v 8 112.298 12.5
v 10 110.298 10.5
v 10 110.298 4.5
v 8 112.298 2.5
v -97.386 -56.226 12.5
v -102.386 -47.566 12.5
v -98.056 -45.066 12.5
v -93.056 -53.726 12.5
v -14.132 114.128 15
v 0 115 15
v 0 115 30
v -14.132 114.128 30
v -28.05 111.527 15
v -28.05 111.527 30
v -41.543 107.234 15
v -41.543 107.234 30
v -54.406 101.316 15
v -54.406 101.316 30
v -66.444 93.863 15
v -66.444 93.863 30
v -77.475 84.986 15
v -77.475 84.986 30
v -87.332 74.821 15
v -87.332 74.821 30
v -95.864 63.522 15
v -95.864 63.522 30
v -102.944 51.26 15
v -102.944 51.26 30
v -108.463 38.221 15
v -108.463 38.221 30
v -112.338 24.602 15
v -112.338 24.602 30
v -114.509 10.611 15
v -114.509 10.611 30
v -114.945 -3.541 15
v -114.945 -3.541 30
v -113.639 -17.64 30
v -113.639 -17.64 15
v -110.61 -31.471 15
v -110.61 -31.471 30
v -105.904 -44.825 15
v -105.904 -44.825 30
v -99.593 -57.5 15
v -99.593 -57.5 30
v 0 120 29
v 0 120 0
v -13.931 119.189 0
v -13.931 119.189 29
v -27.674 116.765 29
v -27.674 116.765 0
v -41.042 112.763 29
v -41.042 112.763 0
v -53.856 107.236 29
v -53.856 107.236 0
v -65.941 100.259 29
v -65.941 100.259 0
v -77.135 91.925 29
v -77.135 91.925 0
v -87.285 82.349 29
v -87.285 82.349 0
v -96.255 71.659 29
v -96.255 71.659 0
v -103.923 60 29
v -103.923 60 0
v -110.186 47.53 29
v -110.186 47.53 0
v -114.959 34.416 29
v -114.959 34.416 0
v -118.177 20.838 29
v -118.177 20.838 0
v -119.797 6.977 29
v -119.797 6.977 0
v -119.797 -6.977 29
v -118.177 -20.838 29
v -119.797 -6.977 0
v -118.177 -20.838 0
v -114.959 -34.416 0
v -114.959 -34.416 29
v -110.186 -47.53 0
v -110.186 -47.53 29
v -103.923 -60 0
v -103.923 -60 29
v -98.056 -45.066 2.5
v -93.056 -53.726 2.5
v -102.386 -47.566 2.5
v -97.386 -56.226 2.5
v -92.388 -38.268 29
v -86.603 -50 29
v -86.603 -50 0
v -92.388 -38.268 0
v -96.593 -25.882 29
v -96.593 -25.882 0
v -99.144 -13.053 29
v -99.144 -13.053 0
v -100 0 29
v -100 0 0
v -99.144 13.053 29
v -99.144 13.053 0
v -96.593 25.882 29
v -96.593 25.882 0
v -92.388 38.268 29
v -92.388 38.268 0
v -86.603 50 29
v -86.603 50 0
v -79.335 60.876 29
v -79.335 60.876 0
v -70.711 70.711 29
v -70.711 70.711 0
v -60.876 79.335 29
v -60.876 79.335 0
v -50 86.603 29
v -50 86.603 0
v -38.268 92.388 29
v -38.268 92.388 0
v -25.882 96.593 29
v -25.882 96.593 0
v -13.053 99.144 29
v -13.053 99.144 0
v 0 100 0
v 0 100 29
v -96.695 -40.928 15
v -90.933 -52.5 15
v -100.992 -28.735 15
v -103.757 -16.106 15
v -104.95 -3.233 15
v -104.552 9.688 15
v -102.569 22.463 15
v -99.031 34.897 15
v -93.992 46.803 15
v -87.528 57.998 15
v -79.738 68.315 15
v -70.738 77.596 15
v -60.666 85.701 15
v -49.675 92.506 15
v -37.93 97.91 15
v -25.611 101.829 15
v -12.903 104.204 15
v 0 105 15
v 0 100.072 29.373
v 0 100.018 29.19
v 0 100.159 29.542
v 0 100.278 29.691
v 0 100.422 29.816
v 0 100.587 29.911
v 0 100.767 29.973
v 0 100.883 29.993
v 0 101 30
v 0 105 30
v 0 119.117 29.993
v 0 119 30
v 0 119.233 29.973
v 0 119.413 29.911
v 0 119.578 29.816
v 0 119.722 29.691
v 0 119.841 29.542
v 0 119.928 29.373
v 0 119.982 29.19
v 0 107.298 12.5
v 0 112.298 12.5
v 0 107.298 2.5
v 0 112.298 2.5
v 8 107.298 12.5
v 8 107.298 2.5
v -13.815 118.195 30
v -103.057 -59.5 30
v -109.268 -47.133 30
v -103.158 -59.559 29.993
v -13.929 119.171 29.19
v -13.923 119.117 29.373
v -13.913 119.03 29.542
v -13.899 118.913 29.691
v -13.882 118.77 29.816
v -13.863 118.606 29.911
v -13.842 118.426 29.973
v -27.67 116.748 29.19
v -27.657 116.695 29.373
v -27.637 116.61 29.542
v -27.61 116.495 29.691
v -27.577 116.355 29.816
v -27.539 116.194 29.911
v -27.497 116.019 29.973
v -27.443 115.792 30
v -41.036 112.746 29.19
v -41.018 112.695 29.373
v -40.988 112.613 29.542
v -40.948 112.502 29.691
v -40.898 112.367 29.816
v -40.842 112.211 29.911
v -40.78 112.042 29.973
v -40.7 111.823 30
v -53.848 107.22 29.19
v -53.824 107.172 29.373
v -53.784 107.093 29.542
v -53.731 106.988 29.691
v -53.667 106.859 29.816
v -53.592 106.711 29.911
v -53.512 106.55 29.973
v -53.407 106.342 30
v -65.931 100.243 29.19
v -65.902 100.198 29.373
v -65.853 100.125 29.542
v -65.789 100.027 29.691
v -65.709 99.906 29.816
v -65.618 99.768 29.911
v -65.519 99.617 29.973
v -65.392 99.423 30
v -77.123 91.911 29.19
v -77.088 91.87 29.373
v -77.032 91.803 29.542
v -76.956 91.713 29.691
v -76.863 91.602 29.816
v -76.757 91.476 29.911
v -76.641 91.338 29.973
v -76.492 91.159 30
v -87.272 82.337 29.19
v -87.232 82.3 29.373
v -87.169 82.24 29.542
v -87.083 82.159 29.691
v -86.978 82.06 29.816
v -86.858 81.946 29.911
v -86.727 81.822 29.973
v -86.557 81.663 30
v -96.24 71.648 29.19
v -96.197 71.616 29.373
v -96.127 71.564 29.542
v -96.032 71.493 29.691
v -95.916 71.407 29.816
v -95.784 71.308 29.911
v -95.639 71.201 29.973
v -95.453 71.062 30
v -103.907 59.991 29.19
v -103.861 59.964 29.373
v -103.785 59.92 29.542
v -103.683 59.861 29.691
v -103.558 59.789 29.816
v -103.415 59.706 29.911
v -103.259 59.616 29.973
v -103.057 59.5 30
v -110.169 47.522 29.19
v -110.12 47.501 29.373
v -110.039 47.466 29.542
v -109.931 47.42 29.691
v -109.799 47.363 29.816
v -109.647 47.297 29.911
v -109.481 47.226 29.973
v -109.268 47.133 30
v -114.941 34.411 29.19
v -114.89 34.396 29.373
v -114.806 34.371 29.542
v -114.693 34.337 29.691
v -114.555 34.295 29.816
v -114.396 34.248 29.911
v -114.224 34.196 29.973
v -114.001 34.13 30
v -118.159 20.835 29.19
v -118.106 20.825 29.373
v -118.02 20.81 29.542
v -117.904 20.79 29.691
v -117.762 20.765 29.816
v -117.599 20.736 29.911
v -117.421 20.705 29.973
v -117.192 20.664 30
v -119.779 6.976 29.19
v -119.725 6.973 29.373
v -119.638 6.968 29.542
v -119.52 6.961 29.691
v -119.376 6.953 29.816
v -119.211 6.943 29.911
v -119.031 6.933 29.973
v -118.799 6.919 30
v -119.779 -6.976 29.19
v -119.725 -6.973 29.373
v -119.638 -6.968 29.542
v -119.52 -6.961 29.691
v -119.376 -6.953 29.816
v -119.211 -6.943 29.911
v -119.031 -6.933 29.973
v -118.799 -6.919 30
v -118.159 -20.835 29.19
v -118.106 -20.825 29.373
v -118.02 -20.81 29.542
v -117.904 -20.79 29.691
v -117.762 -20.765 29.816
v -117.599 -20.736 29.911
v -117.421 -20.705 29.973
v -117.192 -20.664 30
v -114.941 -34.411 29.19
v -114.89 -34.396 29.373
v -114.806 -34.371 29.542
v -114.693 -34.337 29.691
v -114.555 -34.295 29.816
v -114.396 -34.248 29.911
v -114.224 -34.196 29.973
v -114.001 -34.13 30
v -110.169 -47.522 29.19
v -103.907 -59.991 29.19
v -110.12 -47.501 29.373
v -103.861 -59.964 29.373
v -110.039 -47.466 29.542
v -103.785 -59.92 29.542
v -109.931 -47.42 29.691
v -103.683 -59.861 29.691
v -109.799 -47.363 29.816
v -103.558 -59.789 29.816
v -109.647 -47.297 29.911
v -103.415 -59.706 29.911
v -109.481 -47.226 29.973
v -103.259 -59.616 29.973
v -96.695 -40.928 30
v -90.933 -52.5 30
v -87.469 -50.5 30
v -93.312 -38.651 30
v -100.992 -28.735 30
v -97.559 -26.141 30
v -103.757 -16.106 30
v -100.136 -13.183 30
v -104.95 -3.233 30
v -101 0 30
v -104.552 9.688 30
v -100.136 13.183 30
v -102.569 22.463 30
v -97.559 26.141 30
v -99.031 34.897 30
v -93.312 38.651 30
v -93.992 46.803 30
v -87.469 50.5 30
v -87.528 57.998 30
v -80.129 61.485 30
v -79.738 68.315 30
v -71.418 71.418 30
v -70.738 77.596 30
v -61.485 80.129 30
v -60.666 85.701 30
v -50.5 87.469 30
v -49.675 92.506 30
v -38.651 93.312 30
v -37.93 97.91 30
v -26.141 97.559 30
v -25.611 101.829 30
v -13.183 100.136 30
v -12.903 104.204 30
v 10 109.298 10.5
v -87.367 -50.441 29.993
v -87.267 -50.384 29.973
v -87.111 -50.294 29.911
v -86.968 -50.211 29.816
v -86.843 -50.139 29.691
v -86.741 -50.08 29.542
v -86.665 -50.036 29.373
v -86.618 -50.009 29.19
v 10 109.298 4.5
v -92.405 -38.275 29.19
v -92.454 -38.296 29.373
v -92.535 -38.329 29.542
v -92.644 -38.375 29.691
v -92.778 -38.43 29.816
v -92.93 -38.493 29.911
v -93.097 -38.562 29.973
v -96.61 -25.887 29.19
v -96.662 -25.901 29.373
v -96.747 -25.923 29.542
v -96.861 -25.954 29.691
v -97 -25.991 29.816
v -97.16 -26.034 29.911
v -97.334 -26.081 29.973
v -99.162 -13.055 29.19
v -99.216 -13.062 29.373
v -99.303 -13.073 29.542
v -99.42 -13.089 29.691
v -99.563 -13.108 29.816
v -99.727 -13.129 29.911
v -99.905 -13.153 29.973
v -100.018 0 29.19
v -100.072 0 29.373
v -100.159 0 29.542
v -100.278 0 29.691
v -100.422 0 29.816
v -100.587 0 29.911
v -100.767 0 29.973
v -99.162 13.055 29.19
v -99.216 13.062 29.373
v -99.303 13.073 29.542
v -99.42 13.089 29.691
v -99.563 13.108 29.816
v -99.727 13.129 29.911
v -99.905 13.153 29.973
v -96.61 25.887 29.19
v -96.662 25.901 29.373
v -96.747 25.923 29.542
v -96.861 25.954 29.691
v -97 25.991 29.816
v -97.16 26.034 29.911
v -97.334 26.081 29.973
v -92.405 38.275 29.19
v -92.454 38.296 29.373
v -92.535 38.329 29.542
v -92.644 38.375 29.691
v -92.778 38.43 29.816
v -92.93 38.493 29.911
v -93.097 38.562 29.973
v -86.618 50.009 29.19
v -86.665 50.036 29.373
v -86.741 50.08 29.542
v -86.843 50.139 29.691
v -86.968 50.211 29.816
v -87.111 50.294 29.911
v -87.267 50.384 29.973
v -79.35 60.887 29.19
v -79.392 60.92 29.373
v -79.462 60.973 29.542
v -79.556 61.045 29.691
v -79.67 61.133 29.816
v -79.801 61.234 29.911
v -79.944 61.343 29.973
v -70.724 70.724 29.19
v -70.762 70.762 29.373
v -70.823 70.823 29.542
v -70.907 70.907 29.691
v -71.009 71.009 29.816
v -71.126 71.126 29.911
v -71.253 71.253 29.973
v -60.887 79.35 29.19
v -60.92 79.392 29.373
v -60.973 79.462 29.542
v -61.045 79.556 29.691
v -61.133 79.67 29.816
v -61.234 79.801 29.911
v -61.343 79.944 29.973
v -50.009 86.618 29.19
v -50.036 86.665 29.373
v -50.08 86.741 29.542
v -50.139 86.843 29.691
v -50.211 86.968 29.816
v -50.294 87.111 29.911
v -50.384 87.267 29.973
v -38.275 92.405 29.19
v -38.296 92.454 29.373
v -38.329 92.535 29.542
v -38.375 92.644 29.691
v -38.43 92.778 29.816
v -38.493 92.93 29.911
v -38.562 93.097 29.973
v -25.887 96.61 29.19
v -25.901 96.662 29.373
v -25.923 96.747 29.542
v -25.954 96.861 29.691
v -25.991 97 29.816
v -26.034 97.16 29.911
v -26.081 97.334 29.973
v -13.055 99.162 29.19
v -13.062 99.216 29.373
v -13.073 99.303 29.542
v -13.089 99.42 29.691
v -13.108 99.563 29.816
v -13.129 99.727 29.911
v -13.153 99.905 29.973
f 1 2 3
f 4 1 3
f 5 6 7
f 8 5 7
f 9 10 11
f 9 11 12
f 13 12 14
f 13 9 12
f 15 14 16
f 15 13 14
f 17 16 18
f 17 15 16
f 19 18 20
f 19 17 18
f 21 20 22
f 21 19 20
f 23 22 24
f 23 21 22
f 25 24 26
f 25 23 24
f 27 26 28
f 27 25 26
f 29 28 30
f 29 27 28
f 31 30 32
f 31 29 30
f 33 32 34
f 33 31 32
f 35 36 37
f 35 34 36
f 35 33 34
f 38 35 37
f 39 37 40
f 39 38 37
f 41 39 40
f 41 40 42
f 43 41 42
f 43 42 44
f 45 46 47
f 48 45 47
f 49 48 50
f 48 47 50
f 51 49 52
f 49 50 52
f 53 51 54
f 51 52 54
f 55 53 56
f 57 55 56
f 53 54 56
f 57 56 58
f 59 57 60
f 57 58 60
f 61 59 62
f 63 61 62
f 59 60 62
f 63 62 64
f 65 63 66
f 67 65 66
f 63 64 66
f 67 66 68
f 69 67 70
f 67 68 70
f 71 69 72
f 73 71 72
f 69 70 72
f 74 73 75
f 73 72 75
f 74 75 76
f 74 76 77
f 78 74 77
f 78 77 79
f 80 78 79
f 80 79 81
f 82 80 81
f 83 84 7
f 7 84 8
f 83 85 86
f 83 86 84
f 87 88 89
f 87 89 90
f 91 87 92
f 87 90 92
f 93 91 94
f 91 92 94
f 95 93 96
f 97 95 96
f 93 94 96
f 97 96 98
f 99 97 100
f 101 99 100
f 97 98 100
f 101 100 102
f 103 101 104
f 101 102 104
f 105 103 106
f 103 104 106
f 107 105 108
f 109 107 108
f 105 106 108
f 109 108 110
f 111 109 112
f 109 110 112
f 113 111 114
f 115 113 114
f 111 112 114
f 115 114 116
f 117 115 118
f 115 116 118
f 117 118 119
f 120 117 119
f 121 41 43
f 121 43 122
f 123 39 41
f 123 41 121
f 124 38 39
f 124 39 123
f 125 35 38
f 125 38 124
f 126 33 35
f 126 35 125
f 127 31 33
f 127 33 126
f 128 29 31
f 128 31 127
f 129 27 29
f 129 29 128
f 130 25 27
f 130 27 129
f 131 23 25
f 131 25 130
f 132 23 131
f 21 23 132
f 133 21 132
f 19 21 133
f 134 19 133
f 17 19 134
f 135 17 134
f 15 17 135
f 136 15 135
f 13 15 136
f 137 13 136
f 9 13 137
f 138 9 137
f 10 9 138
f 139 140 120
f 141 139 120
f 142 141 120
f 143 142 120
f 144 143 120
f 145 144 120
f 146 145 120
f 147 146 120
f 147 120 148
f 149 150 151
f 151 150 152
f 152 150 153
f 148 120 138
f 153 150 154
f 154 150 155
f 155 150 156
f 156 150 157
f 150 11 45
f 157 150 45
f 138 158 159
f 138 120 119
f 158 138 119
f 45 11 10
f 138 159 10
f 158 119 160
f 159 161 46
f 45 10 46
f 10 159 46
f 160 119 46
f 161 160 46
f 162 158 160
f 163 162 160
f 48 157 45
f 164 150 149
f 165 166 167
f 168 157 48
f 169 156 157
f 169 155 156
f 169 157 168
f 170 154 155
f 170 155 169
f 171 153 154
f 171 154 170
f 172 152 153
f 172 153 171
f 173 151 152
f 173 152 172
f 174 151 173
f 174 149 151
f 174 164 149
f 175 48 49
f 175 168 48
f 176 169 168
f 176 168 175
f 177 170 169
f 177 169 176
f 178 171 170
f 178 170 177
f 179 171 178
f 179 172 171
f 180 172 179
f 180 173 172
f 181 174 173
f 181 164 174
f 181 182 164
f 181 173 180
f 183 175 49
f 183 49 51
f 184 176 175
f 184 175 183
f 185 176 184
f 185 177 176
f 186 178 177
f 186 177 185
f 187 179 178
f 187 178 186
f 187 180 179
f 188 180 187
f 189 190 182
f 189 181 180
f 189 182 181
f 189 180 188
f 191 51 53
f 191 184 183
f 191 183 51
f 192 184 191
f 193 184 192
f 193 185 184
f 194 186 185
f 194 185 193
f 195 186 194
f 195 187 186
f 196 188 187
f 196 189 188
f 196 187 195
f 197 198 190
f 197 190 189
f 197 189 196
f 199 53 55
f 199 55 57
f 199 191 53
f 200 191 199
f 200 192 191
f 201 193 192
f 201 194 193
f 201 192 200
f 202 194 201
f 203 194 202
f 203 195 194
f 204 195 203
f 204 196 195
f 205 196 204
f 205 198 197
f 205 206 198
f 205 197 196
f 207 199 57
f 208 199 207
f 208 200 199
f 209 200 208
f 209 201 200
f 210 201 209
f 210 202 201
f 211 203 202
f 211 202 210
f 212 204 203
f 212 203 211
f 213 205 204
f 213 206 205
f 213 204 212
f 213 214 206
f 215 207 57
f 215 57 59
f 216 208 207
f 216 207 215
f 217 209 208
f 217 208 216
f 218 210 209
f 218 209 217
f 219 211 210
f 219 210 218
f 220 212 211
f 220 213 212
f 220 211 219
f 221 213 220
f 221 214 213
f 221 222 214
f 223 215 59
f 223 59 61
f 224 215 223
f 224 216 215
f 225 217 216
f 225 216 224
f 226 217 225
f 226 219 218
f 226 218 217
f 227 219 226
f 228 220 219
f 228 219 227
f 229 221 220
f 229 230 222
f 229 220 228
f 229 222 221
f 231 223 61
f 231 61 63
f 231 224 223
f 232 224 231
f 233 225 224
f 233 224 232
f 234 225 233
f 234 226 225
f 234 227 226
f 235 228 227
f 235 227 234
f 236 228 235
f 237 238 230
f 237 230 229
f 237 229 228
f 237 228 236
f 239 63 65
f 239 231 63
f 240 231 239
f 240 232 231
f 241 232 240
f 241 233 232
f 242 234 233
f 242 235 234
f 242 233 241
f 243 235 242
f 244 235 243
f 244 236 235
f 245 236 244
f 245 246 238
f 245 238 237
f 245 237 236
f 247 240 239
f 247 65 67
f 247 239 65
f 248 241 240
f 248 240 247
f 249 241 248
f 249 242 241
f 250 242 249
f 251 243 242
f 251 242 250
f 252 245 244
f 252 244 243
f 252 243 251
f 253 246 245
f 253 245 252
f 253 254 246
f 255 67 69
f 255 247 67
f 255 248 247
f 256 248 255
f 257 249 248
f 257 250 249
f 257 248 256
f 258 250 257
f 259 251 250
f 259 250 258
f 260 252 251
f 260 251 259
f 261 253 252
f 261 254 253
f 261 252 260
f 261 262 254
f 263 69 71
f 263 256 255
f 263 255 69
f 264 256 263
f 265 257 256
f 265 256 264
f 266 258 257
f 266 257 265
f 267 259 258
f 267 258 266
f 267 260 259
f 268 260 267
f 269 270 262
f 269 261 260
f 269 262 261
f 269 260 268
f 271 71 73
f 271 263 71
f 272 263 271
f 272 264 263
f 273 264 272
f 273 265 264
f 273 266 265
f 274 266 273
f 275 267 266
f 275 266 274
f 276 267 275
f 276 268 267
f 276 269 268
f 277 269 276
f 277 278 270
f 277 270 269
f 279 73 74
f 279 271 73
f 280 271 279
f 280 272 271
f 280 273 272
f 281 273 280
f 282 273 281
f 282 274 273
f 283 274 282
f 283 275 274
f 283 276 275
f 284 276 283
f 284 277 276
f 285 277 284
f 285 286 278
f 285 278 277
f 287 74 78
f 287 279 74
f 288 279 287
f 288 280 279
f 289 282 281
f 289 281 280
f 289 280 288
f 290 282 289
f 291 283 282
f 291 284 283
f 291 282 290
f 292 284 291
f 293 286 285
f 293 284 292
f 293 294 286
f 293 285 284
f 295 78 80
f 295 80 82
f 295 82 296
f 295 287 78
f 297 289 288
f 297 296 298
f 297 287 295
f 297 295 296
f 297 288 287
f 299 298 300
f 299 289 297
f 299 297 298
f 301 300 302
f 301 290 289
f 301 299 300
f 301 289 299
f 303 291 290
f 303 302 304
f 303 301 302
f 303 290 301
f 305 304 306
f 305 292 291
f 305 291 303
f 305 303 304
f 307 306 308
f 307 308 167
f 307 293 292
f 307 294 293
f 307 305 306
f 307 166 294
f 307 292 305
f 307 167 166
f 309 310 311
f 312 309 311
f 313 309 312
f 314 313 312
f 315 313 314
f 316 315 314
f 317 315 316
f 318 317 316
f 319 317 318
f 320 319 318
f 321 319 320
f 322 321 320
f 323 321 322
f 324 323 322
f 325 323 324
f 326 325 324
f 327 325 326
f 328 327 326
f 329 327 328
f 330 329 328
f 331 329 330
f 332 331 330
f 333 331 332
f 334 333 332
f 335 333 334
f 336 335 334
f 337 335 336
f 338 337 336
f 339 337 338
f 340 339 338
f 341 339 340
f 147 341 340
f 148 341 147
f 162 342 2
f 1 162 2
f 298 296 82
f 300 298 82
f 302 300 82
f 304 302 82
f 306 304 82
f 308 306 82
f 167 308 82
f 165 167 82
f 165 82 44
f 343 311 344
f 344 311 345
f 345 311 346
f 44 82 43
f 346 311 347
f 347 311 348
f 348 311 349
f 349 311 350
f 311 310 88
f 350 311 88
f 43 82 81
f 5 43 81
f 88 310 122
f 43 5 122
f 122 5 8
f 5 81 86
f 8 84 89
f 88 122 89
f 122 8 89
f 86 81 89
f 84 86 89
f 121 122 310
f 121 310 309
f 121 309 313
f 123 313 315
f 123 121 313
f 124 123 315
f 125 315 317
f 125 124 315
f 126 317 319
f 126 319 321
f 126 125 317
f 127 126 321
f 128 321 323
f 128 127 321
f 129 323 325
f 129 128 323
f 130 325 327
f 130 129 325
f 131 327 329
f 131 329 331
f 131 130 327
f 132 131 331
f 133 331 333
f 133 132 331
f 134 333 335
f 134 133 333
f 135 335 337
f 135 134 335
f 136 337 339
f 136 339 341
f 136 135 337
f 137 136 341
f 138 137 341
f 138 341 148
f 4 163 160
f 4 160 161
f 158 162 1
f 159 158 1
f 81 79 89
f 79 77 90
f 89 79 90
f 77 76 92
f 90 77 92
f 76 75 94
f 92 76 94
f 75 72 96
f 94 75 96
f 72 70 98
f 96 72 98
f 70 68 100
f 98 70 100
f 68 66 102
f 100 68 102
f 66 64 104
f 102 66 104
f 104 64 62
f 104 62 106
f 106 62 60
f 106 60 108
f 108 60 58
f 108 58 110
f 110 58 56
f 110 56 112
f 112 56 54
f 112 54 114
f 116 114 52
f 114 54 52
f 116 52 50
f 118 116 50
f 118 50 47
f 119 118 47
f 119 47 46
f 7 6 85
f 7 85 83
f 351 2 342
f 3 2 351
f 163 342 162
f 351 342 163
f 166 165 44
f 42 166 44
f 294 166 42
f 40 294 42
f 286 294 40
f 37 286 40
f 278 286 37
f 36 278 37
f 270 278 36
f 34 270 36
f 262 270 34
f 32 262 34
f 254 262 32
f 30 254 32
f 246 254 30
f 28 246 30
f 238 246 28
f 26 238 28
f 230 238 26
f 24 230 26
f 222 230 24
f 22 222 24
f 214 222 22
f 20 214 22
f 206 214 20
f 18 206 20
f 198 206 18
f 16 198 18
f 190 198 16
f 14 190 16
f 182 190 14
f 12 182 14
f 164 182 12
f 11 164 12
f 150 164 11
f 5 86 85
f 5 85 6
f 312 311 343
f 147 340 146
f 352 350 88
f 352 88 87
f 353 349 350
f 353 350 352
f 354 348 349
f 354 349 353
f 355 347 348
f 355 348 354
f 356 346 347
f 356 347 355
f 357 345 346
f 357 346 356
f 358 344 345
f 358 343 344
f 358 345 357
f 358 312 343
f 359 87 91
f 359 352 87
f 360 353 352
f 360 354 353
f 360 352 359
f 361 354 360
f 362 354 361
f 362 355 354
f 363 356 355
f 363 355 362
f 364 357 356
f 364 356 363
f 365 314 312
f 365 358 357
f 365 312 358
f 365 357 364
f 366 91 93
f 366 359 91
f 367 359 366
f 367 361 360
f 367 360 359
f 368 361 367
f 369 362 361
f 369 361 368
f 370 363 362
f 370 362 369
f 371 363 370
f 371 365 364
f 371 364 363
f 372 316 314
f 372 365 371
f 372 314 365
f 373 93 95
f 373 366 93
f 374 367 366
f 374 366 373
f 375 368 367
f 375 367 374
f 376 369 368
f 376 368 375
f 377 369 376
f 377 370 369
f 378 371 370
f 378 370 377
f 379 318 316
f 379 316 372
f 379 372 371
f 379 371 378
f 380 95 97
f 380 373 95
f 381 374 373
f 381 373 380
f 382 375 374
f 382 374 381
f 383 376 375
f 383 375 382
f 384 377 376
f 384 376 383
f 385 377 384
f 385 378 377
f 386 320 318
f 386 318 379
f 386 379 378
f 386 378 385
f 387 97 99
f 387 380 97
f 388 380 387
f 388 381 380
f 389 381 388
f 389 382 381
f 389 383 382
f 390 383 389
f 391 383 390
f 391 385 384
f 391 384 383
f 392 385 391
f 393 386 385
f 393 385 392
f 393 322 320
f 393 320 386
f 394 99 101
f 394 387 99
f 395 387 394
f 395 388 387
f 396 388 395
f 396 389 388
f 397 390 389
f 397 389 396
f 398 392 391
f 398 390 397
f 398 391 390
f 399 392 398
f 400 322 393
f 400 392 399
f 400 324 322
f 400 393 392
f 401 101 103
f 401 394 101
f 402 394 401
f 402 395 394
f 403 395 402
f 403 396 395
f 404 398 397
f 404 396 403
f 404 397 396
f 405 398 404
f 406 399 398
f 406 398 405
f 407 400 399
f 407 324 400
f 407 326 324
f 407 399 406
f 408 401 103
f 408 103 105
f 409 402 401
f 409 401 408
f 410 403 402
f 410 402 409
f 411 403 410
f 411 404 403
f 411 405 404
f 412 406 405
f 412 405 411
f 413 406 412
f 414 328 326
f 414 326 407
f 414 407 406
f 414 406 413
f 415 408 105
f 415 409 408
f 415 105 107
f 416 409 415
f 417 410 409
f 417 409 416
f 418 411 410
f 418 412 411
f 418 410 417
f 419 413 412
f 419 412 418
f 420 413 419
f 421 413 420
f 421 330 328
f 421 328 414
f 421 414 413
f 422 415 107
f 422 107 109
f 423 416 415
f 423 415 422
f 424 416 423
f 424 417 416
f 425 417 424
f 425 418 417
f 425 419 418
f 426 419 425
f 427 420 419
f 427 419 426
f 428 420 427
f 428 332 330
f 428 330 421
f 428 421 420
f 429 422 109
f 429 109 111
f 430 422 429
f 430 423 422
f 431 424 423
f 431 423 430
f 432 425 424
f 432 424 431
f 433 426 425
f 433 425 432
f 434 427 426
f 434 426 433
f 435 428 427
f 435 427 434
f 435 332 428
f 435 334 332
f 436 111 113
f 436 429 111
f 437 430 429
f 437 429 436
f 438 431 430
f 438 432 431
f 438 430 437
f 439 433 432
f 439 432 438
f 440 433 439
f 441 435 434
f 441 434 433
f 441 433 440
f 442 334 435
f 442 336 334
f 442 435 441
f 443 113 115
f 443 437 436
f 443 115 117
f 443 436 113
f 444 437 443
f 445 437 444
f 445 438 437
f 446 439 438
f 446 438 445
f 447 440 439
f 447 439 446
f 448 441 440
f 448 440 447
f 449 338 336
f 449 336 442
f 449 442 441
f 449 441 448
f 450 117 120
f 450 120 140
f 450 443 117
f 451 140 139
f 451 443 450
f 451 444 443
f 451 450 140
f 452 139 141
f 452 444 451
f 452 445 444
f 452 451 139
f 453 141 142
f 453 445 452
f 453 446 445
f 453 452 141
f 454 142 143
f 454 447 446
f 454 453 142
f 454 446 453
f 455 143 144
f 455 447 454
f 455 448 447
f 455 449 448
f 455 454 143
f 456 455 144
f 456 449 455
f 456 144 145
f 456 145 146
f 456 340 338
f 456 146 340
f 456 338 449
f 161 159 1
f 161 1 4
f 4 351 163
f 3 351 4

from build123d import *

# Parameters (mm, degrees)
BOSS_EXTRUDE2_DEPTH     = 30
CUT_EXTRUDE1_DEPTH      = 173.336879396
CUT_EXTRUDE1_DEPTH_BACK = 15
SKETCH4_W               = 10
SKETCH4_H               = 5
BOSS_EXTRUDE3_DEPTH     = 10
CHAMFER1_SIZE           = 2
SKETCH6_W               = 5
SKETCH6_H               = 10
CUT_EXTRUDE2_DEPTH      = 10
FILLET1_R               = 1


with BuildPart() as part:
    # Sketch1 → Boss-Extrude2 (new body)
    with BuildSketch(Plane.XY):
        with BuildLine():
            Line((0, 100), (0, 120))
            ThreePointArc((0, 120), (-103.923048454, 60), (-103.923048454, -60))
            Line((-103.923048454, -60), (-86.602540378, -50))
            ThreePointArc((-86.602540378, -50), (-86.602540378, 50), (0, 100))
        make_face()
    extrude(amount=BOSS_EXTRUDE2_DEPTH)

    # Sketch3 → Cut-Extrude1 (cut, two sides: drawn at the far end of the back side and taken through both)
    with BuildSketch(Plane.XY.offset(30).offset(-CUT_EXTRUDE1_DEPTH_BACK)):
        with BuildLine():
            ThreePointArc((-90.932667397, -52.5), (-90.932667397, 52.5), (0, 105))
            Line((0, 105), (0, 115))
            ThreePointArc((0, 115), (-99.592921435, 57.5), (-99.592921435, -57.5))
            Line((-99.592921435, -57.5), (-90.932667397, -52.5))
        make_face()
    extrude(amount=CUT_EXTRUDE1_DEPTH + CUT_EXTRUDE1_DEPTH_BACK, mode=Mode.SUBTRACT)

    # Sketch4 → Boss-Extrude3 (add)
    with BuildSketch(Plane(origin=(0, 0, 0), x_dir=(0, 0, -1), z_dir=(1, 0, 0))):
        with Locations((-7.5, 109.798266437)):
            Rectangle(SKETCH4_W, SKETCH4_H)
    extrude(amount=BOSS_EXTRUDE3_DEPTH)

    # Chamfer1
    chamfer1_edges = [part.edges().sort_by_distance(p)[0] for p in [
        (10, 109.798266437, 2.5),
        (10, 112.298266437, 7.5),
        (10, 109.798266437, 12.5),
        (10, 107.298266437, 7.5),
    ]]
    chamfer(chamfer1_edges, length=CHAMFER1_SIZE)

    # Sketch6 → Cut-Extrude2 (cut)
    with BuildSketch(Plane(origin=(0, 0, 0), x_dir=(0.8660254037844363, 0.5000000000000042, 0), z_dir=(0.5000000000000041, -0.8660254037844362, 0))):
        with Locations((-109.951600937, 7.5)):
            Rectangle(SKETCH6_W, SKETCH6_H)
    extrude(amount=-CUT_EXTRUDE2_DEPTH, mode=Mode.SUBTRACT)

    # Fillet1
    fillet1_edges = [part.edges().sort_by_distance(p)[0] for p in [
        (-86.602540378, 50, 30),
        (-103.923048454, 60, 30),
    ]]
    fillet(fillet1_edges, radius=FILLET1_R)


solid = part.part
